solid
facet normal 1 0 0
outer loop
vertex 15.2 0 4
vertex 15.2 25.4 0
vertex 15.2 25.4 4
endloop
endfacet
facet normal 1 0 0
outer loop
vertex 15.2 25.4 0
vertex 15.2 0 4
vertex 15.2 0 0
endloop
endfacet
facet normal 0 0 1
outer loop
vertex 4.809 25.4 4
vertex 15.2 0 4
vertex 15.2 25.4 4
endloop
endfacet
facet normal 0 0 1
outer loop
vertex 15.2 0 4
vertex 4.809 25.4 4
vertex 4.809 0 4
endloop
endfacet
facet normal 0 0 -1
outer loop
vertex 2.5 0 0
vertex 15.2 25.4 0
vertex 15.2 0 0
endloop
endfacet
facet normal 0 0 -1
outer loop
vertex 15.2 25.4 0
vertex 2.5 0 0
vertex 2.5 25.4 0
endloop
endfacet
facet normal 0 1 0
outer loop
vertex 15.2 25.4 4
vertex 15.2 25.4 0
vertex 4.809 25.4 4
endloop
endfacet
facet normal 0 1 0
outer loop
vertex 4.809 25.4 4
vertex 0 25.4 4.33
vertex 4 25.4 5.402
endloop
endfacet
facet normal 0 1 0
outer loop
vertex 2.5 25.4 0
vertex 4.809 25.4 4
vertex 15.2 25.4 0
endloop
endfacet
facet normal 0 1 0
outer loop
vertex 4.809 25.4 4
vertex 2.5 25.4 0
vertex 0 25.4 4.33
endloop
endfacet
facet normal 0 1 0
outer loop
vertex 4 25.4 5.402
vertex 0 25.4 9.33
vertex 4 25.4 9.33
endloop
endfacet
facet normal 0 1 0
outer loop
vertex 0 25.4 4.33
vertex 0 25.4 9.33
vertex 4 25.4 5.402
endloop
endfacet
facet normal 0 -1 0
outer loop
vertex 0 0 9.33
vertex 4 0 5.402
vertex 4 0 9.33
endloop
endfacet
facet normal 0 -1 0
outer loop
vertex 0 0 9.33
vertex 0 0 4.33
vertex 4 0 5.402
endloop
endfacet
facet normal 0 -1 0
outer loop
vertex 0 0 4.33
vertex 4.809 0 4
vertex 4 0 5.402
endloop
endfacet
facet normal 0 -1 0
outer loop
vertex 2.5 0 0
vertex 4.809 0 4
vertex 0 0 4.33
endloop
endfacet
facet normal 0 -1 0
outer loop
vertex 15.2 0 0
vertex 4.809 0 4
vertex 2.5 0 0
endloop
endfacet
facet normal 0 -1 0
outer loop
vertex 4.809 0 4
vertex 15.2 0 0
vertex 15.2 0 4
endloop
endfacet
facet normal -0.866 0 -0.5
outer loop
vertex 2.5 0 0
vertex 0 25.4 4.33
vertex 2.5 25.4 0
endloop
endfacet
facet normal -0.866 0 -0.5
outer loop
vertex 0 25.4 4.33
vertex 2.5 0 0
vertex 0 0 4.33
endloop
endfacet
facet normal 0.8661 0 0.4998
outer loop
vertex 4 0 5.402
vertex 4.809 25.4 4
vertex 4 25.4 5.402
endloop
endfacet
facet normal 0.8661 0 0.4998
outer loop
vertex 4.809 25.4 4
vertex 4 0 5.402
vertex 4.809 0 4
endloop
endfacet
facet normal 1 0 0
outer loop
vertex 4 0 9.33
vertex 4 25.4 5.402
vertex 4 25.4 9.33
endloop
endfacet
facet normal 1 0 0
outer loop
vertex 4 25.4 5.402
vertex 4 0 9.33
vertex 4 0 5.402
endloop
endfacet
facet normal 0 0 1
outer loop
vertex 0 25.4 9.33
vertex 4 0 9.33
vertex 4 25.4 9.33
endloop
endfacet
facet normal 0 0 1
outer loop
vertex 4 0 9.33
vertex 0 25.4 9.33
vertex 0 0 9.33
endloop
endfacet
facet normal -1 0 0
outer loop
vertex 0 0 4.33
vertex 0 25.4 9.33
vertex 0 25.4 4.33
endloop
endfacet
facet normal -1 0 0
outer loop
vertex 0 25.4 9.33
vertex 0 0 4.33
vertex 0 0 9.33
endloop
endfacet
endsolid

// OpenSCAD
in = 25.4;
clip_depth = .5*in;
clip_length = 1*in;
thickness = 4;

module clip(depth, length) {
    translate([2.5,0,0]) 
    union(){
      cube([depth, length, thickness]);
      rotate([0,330,0]) cube([thickness, length, 5]);
      translate([-2.5,0,4.33]) cube([thickness, length, 5]);
    }
}

clip(clip_depth, clip_length);
